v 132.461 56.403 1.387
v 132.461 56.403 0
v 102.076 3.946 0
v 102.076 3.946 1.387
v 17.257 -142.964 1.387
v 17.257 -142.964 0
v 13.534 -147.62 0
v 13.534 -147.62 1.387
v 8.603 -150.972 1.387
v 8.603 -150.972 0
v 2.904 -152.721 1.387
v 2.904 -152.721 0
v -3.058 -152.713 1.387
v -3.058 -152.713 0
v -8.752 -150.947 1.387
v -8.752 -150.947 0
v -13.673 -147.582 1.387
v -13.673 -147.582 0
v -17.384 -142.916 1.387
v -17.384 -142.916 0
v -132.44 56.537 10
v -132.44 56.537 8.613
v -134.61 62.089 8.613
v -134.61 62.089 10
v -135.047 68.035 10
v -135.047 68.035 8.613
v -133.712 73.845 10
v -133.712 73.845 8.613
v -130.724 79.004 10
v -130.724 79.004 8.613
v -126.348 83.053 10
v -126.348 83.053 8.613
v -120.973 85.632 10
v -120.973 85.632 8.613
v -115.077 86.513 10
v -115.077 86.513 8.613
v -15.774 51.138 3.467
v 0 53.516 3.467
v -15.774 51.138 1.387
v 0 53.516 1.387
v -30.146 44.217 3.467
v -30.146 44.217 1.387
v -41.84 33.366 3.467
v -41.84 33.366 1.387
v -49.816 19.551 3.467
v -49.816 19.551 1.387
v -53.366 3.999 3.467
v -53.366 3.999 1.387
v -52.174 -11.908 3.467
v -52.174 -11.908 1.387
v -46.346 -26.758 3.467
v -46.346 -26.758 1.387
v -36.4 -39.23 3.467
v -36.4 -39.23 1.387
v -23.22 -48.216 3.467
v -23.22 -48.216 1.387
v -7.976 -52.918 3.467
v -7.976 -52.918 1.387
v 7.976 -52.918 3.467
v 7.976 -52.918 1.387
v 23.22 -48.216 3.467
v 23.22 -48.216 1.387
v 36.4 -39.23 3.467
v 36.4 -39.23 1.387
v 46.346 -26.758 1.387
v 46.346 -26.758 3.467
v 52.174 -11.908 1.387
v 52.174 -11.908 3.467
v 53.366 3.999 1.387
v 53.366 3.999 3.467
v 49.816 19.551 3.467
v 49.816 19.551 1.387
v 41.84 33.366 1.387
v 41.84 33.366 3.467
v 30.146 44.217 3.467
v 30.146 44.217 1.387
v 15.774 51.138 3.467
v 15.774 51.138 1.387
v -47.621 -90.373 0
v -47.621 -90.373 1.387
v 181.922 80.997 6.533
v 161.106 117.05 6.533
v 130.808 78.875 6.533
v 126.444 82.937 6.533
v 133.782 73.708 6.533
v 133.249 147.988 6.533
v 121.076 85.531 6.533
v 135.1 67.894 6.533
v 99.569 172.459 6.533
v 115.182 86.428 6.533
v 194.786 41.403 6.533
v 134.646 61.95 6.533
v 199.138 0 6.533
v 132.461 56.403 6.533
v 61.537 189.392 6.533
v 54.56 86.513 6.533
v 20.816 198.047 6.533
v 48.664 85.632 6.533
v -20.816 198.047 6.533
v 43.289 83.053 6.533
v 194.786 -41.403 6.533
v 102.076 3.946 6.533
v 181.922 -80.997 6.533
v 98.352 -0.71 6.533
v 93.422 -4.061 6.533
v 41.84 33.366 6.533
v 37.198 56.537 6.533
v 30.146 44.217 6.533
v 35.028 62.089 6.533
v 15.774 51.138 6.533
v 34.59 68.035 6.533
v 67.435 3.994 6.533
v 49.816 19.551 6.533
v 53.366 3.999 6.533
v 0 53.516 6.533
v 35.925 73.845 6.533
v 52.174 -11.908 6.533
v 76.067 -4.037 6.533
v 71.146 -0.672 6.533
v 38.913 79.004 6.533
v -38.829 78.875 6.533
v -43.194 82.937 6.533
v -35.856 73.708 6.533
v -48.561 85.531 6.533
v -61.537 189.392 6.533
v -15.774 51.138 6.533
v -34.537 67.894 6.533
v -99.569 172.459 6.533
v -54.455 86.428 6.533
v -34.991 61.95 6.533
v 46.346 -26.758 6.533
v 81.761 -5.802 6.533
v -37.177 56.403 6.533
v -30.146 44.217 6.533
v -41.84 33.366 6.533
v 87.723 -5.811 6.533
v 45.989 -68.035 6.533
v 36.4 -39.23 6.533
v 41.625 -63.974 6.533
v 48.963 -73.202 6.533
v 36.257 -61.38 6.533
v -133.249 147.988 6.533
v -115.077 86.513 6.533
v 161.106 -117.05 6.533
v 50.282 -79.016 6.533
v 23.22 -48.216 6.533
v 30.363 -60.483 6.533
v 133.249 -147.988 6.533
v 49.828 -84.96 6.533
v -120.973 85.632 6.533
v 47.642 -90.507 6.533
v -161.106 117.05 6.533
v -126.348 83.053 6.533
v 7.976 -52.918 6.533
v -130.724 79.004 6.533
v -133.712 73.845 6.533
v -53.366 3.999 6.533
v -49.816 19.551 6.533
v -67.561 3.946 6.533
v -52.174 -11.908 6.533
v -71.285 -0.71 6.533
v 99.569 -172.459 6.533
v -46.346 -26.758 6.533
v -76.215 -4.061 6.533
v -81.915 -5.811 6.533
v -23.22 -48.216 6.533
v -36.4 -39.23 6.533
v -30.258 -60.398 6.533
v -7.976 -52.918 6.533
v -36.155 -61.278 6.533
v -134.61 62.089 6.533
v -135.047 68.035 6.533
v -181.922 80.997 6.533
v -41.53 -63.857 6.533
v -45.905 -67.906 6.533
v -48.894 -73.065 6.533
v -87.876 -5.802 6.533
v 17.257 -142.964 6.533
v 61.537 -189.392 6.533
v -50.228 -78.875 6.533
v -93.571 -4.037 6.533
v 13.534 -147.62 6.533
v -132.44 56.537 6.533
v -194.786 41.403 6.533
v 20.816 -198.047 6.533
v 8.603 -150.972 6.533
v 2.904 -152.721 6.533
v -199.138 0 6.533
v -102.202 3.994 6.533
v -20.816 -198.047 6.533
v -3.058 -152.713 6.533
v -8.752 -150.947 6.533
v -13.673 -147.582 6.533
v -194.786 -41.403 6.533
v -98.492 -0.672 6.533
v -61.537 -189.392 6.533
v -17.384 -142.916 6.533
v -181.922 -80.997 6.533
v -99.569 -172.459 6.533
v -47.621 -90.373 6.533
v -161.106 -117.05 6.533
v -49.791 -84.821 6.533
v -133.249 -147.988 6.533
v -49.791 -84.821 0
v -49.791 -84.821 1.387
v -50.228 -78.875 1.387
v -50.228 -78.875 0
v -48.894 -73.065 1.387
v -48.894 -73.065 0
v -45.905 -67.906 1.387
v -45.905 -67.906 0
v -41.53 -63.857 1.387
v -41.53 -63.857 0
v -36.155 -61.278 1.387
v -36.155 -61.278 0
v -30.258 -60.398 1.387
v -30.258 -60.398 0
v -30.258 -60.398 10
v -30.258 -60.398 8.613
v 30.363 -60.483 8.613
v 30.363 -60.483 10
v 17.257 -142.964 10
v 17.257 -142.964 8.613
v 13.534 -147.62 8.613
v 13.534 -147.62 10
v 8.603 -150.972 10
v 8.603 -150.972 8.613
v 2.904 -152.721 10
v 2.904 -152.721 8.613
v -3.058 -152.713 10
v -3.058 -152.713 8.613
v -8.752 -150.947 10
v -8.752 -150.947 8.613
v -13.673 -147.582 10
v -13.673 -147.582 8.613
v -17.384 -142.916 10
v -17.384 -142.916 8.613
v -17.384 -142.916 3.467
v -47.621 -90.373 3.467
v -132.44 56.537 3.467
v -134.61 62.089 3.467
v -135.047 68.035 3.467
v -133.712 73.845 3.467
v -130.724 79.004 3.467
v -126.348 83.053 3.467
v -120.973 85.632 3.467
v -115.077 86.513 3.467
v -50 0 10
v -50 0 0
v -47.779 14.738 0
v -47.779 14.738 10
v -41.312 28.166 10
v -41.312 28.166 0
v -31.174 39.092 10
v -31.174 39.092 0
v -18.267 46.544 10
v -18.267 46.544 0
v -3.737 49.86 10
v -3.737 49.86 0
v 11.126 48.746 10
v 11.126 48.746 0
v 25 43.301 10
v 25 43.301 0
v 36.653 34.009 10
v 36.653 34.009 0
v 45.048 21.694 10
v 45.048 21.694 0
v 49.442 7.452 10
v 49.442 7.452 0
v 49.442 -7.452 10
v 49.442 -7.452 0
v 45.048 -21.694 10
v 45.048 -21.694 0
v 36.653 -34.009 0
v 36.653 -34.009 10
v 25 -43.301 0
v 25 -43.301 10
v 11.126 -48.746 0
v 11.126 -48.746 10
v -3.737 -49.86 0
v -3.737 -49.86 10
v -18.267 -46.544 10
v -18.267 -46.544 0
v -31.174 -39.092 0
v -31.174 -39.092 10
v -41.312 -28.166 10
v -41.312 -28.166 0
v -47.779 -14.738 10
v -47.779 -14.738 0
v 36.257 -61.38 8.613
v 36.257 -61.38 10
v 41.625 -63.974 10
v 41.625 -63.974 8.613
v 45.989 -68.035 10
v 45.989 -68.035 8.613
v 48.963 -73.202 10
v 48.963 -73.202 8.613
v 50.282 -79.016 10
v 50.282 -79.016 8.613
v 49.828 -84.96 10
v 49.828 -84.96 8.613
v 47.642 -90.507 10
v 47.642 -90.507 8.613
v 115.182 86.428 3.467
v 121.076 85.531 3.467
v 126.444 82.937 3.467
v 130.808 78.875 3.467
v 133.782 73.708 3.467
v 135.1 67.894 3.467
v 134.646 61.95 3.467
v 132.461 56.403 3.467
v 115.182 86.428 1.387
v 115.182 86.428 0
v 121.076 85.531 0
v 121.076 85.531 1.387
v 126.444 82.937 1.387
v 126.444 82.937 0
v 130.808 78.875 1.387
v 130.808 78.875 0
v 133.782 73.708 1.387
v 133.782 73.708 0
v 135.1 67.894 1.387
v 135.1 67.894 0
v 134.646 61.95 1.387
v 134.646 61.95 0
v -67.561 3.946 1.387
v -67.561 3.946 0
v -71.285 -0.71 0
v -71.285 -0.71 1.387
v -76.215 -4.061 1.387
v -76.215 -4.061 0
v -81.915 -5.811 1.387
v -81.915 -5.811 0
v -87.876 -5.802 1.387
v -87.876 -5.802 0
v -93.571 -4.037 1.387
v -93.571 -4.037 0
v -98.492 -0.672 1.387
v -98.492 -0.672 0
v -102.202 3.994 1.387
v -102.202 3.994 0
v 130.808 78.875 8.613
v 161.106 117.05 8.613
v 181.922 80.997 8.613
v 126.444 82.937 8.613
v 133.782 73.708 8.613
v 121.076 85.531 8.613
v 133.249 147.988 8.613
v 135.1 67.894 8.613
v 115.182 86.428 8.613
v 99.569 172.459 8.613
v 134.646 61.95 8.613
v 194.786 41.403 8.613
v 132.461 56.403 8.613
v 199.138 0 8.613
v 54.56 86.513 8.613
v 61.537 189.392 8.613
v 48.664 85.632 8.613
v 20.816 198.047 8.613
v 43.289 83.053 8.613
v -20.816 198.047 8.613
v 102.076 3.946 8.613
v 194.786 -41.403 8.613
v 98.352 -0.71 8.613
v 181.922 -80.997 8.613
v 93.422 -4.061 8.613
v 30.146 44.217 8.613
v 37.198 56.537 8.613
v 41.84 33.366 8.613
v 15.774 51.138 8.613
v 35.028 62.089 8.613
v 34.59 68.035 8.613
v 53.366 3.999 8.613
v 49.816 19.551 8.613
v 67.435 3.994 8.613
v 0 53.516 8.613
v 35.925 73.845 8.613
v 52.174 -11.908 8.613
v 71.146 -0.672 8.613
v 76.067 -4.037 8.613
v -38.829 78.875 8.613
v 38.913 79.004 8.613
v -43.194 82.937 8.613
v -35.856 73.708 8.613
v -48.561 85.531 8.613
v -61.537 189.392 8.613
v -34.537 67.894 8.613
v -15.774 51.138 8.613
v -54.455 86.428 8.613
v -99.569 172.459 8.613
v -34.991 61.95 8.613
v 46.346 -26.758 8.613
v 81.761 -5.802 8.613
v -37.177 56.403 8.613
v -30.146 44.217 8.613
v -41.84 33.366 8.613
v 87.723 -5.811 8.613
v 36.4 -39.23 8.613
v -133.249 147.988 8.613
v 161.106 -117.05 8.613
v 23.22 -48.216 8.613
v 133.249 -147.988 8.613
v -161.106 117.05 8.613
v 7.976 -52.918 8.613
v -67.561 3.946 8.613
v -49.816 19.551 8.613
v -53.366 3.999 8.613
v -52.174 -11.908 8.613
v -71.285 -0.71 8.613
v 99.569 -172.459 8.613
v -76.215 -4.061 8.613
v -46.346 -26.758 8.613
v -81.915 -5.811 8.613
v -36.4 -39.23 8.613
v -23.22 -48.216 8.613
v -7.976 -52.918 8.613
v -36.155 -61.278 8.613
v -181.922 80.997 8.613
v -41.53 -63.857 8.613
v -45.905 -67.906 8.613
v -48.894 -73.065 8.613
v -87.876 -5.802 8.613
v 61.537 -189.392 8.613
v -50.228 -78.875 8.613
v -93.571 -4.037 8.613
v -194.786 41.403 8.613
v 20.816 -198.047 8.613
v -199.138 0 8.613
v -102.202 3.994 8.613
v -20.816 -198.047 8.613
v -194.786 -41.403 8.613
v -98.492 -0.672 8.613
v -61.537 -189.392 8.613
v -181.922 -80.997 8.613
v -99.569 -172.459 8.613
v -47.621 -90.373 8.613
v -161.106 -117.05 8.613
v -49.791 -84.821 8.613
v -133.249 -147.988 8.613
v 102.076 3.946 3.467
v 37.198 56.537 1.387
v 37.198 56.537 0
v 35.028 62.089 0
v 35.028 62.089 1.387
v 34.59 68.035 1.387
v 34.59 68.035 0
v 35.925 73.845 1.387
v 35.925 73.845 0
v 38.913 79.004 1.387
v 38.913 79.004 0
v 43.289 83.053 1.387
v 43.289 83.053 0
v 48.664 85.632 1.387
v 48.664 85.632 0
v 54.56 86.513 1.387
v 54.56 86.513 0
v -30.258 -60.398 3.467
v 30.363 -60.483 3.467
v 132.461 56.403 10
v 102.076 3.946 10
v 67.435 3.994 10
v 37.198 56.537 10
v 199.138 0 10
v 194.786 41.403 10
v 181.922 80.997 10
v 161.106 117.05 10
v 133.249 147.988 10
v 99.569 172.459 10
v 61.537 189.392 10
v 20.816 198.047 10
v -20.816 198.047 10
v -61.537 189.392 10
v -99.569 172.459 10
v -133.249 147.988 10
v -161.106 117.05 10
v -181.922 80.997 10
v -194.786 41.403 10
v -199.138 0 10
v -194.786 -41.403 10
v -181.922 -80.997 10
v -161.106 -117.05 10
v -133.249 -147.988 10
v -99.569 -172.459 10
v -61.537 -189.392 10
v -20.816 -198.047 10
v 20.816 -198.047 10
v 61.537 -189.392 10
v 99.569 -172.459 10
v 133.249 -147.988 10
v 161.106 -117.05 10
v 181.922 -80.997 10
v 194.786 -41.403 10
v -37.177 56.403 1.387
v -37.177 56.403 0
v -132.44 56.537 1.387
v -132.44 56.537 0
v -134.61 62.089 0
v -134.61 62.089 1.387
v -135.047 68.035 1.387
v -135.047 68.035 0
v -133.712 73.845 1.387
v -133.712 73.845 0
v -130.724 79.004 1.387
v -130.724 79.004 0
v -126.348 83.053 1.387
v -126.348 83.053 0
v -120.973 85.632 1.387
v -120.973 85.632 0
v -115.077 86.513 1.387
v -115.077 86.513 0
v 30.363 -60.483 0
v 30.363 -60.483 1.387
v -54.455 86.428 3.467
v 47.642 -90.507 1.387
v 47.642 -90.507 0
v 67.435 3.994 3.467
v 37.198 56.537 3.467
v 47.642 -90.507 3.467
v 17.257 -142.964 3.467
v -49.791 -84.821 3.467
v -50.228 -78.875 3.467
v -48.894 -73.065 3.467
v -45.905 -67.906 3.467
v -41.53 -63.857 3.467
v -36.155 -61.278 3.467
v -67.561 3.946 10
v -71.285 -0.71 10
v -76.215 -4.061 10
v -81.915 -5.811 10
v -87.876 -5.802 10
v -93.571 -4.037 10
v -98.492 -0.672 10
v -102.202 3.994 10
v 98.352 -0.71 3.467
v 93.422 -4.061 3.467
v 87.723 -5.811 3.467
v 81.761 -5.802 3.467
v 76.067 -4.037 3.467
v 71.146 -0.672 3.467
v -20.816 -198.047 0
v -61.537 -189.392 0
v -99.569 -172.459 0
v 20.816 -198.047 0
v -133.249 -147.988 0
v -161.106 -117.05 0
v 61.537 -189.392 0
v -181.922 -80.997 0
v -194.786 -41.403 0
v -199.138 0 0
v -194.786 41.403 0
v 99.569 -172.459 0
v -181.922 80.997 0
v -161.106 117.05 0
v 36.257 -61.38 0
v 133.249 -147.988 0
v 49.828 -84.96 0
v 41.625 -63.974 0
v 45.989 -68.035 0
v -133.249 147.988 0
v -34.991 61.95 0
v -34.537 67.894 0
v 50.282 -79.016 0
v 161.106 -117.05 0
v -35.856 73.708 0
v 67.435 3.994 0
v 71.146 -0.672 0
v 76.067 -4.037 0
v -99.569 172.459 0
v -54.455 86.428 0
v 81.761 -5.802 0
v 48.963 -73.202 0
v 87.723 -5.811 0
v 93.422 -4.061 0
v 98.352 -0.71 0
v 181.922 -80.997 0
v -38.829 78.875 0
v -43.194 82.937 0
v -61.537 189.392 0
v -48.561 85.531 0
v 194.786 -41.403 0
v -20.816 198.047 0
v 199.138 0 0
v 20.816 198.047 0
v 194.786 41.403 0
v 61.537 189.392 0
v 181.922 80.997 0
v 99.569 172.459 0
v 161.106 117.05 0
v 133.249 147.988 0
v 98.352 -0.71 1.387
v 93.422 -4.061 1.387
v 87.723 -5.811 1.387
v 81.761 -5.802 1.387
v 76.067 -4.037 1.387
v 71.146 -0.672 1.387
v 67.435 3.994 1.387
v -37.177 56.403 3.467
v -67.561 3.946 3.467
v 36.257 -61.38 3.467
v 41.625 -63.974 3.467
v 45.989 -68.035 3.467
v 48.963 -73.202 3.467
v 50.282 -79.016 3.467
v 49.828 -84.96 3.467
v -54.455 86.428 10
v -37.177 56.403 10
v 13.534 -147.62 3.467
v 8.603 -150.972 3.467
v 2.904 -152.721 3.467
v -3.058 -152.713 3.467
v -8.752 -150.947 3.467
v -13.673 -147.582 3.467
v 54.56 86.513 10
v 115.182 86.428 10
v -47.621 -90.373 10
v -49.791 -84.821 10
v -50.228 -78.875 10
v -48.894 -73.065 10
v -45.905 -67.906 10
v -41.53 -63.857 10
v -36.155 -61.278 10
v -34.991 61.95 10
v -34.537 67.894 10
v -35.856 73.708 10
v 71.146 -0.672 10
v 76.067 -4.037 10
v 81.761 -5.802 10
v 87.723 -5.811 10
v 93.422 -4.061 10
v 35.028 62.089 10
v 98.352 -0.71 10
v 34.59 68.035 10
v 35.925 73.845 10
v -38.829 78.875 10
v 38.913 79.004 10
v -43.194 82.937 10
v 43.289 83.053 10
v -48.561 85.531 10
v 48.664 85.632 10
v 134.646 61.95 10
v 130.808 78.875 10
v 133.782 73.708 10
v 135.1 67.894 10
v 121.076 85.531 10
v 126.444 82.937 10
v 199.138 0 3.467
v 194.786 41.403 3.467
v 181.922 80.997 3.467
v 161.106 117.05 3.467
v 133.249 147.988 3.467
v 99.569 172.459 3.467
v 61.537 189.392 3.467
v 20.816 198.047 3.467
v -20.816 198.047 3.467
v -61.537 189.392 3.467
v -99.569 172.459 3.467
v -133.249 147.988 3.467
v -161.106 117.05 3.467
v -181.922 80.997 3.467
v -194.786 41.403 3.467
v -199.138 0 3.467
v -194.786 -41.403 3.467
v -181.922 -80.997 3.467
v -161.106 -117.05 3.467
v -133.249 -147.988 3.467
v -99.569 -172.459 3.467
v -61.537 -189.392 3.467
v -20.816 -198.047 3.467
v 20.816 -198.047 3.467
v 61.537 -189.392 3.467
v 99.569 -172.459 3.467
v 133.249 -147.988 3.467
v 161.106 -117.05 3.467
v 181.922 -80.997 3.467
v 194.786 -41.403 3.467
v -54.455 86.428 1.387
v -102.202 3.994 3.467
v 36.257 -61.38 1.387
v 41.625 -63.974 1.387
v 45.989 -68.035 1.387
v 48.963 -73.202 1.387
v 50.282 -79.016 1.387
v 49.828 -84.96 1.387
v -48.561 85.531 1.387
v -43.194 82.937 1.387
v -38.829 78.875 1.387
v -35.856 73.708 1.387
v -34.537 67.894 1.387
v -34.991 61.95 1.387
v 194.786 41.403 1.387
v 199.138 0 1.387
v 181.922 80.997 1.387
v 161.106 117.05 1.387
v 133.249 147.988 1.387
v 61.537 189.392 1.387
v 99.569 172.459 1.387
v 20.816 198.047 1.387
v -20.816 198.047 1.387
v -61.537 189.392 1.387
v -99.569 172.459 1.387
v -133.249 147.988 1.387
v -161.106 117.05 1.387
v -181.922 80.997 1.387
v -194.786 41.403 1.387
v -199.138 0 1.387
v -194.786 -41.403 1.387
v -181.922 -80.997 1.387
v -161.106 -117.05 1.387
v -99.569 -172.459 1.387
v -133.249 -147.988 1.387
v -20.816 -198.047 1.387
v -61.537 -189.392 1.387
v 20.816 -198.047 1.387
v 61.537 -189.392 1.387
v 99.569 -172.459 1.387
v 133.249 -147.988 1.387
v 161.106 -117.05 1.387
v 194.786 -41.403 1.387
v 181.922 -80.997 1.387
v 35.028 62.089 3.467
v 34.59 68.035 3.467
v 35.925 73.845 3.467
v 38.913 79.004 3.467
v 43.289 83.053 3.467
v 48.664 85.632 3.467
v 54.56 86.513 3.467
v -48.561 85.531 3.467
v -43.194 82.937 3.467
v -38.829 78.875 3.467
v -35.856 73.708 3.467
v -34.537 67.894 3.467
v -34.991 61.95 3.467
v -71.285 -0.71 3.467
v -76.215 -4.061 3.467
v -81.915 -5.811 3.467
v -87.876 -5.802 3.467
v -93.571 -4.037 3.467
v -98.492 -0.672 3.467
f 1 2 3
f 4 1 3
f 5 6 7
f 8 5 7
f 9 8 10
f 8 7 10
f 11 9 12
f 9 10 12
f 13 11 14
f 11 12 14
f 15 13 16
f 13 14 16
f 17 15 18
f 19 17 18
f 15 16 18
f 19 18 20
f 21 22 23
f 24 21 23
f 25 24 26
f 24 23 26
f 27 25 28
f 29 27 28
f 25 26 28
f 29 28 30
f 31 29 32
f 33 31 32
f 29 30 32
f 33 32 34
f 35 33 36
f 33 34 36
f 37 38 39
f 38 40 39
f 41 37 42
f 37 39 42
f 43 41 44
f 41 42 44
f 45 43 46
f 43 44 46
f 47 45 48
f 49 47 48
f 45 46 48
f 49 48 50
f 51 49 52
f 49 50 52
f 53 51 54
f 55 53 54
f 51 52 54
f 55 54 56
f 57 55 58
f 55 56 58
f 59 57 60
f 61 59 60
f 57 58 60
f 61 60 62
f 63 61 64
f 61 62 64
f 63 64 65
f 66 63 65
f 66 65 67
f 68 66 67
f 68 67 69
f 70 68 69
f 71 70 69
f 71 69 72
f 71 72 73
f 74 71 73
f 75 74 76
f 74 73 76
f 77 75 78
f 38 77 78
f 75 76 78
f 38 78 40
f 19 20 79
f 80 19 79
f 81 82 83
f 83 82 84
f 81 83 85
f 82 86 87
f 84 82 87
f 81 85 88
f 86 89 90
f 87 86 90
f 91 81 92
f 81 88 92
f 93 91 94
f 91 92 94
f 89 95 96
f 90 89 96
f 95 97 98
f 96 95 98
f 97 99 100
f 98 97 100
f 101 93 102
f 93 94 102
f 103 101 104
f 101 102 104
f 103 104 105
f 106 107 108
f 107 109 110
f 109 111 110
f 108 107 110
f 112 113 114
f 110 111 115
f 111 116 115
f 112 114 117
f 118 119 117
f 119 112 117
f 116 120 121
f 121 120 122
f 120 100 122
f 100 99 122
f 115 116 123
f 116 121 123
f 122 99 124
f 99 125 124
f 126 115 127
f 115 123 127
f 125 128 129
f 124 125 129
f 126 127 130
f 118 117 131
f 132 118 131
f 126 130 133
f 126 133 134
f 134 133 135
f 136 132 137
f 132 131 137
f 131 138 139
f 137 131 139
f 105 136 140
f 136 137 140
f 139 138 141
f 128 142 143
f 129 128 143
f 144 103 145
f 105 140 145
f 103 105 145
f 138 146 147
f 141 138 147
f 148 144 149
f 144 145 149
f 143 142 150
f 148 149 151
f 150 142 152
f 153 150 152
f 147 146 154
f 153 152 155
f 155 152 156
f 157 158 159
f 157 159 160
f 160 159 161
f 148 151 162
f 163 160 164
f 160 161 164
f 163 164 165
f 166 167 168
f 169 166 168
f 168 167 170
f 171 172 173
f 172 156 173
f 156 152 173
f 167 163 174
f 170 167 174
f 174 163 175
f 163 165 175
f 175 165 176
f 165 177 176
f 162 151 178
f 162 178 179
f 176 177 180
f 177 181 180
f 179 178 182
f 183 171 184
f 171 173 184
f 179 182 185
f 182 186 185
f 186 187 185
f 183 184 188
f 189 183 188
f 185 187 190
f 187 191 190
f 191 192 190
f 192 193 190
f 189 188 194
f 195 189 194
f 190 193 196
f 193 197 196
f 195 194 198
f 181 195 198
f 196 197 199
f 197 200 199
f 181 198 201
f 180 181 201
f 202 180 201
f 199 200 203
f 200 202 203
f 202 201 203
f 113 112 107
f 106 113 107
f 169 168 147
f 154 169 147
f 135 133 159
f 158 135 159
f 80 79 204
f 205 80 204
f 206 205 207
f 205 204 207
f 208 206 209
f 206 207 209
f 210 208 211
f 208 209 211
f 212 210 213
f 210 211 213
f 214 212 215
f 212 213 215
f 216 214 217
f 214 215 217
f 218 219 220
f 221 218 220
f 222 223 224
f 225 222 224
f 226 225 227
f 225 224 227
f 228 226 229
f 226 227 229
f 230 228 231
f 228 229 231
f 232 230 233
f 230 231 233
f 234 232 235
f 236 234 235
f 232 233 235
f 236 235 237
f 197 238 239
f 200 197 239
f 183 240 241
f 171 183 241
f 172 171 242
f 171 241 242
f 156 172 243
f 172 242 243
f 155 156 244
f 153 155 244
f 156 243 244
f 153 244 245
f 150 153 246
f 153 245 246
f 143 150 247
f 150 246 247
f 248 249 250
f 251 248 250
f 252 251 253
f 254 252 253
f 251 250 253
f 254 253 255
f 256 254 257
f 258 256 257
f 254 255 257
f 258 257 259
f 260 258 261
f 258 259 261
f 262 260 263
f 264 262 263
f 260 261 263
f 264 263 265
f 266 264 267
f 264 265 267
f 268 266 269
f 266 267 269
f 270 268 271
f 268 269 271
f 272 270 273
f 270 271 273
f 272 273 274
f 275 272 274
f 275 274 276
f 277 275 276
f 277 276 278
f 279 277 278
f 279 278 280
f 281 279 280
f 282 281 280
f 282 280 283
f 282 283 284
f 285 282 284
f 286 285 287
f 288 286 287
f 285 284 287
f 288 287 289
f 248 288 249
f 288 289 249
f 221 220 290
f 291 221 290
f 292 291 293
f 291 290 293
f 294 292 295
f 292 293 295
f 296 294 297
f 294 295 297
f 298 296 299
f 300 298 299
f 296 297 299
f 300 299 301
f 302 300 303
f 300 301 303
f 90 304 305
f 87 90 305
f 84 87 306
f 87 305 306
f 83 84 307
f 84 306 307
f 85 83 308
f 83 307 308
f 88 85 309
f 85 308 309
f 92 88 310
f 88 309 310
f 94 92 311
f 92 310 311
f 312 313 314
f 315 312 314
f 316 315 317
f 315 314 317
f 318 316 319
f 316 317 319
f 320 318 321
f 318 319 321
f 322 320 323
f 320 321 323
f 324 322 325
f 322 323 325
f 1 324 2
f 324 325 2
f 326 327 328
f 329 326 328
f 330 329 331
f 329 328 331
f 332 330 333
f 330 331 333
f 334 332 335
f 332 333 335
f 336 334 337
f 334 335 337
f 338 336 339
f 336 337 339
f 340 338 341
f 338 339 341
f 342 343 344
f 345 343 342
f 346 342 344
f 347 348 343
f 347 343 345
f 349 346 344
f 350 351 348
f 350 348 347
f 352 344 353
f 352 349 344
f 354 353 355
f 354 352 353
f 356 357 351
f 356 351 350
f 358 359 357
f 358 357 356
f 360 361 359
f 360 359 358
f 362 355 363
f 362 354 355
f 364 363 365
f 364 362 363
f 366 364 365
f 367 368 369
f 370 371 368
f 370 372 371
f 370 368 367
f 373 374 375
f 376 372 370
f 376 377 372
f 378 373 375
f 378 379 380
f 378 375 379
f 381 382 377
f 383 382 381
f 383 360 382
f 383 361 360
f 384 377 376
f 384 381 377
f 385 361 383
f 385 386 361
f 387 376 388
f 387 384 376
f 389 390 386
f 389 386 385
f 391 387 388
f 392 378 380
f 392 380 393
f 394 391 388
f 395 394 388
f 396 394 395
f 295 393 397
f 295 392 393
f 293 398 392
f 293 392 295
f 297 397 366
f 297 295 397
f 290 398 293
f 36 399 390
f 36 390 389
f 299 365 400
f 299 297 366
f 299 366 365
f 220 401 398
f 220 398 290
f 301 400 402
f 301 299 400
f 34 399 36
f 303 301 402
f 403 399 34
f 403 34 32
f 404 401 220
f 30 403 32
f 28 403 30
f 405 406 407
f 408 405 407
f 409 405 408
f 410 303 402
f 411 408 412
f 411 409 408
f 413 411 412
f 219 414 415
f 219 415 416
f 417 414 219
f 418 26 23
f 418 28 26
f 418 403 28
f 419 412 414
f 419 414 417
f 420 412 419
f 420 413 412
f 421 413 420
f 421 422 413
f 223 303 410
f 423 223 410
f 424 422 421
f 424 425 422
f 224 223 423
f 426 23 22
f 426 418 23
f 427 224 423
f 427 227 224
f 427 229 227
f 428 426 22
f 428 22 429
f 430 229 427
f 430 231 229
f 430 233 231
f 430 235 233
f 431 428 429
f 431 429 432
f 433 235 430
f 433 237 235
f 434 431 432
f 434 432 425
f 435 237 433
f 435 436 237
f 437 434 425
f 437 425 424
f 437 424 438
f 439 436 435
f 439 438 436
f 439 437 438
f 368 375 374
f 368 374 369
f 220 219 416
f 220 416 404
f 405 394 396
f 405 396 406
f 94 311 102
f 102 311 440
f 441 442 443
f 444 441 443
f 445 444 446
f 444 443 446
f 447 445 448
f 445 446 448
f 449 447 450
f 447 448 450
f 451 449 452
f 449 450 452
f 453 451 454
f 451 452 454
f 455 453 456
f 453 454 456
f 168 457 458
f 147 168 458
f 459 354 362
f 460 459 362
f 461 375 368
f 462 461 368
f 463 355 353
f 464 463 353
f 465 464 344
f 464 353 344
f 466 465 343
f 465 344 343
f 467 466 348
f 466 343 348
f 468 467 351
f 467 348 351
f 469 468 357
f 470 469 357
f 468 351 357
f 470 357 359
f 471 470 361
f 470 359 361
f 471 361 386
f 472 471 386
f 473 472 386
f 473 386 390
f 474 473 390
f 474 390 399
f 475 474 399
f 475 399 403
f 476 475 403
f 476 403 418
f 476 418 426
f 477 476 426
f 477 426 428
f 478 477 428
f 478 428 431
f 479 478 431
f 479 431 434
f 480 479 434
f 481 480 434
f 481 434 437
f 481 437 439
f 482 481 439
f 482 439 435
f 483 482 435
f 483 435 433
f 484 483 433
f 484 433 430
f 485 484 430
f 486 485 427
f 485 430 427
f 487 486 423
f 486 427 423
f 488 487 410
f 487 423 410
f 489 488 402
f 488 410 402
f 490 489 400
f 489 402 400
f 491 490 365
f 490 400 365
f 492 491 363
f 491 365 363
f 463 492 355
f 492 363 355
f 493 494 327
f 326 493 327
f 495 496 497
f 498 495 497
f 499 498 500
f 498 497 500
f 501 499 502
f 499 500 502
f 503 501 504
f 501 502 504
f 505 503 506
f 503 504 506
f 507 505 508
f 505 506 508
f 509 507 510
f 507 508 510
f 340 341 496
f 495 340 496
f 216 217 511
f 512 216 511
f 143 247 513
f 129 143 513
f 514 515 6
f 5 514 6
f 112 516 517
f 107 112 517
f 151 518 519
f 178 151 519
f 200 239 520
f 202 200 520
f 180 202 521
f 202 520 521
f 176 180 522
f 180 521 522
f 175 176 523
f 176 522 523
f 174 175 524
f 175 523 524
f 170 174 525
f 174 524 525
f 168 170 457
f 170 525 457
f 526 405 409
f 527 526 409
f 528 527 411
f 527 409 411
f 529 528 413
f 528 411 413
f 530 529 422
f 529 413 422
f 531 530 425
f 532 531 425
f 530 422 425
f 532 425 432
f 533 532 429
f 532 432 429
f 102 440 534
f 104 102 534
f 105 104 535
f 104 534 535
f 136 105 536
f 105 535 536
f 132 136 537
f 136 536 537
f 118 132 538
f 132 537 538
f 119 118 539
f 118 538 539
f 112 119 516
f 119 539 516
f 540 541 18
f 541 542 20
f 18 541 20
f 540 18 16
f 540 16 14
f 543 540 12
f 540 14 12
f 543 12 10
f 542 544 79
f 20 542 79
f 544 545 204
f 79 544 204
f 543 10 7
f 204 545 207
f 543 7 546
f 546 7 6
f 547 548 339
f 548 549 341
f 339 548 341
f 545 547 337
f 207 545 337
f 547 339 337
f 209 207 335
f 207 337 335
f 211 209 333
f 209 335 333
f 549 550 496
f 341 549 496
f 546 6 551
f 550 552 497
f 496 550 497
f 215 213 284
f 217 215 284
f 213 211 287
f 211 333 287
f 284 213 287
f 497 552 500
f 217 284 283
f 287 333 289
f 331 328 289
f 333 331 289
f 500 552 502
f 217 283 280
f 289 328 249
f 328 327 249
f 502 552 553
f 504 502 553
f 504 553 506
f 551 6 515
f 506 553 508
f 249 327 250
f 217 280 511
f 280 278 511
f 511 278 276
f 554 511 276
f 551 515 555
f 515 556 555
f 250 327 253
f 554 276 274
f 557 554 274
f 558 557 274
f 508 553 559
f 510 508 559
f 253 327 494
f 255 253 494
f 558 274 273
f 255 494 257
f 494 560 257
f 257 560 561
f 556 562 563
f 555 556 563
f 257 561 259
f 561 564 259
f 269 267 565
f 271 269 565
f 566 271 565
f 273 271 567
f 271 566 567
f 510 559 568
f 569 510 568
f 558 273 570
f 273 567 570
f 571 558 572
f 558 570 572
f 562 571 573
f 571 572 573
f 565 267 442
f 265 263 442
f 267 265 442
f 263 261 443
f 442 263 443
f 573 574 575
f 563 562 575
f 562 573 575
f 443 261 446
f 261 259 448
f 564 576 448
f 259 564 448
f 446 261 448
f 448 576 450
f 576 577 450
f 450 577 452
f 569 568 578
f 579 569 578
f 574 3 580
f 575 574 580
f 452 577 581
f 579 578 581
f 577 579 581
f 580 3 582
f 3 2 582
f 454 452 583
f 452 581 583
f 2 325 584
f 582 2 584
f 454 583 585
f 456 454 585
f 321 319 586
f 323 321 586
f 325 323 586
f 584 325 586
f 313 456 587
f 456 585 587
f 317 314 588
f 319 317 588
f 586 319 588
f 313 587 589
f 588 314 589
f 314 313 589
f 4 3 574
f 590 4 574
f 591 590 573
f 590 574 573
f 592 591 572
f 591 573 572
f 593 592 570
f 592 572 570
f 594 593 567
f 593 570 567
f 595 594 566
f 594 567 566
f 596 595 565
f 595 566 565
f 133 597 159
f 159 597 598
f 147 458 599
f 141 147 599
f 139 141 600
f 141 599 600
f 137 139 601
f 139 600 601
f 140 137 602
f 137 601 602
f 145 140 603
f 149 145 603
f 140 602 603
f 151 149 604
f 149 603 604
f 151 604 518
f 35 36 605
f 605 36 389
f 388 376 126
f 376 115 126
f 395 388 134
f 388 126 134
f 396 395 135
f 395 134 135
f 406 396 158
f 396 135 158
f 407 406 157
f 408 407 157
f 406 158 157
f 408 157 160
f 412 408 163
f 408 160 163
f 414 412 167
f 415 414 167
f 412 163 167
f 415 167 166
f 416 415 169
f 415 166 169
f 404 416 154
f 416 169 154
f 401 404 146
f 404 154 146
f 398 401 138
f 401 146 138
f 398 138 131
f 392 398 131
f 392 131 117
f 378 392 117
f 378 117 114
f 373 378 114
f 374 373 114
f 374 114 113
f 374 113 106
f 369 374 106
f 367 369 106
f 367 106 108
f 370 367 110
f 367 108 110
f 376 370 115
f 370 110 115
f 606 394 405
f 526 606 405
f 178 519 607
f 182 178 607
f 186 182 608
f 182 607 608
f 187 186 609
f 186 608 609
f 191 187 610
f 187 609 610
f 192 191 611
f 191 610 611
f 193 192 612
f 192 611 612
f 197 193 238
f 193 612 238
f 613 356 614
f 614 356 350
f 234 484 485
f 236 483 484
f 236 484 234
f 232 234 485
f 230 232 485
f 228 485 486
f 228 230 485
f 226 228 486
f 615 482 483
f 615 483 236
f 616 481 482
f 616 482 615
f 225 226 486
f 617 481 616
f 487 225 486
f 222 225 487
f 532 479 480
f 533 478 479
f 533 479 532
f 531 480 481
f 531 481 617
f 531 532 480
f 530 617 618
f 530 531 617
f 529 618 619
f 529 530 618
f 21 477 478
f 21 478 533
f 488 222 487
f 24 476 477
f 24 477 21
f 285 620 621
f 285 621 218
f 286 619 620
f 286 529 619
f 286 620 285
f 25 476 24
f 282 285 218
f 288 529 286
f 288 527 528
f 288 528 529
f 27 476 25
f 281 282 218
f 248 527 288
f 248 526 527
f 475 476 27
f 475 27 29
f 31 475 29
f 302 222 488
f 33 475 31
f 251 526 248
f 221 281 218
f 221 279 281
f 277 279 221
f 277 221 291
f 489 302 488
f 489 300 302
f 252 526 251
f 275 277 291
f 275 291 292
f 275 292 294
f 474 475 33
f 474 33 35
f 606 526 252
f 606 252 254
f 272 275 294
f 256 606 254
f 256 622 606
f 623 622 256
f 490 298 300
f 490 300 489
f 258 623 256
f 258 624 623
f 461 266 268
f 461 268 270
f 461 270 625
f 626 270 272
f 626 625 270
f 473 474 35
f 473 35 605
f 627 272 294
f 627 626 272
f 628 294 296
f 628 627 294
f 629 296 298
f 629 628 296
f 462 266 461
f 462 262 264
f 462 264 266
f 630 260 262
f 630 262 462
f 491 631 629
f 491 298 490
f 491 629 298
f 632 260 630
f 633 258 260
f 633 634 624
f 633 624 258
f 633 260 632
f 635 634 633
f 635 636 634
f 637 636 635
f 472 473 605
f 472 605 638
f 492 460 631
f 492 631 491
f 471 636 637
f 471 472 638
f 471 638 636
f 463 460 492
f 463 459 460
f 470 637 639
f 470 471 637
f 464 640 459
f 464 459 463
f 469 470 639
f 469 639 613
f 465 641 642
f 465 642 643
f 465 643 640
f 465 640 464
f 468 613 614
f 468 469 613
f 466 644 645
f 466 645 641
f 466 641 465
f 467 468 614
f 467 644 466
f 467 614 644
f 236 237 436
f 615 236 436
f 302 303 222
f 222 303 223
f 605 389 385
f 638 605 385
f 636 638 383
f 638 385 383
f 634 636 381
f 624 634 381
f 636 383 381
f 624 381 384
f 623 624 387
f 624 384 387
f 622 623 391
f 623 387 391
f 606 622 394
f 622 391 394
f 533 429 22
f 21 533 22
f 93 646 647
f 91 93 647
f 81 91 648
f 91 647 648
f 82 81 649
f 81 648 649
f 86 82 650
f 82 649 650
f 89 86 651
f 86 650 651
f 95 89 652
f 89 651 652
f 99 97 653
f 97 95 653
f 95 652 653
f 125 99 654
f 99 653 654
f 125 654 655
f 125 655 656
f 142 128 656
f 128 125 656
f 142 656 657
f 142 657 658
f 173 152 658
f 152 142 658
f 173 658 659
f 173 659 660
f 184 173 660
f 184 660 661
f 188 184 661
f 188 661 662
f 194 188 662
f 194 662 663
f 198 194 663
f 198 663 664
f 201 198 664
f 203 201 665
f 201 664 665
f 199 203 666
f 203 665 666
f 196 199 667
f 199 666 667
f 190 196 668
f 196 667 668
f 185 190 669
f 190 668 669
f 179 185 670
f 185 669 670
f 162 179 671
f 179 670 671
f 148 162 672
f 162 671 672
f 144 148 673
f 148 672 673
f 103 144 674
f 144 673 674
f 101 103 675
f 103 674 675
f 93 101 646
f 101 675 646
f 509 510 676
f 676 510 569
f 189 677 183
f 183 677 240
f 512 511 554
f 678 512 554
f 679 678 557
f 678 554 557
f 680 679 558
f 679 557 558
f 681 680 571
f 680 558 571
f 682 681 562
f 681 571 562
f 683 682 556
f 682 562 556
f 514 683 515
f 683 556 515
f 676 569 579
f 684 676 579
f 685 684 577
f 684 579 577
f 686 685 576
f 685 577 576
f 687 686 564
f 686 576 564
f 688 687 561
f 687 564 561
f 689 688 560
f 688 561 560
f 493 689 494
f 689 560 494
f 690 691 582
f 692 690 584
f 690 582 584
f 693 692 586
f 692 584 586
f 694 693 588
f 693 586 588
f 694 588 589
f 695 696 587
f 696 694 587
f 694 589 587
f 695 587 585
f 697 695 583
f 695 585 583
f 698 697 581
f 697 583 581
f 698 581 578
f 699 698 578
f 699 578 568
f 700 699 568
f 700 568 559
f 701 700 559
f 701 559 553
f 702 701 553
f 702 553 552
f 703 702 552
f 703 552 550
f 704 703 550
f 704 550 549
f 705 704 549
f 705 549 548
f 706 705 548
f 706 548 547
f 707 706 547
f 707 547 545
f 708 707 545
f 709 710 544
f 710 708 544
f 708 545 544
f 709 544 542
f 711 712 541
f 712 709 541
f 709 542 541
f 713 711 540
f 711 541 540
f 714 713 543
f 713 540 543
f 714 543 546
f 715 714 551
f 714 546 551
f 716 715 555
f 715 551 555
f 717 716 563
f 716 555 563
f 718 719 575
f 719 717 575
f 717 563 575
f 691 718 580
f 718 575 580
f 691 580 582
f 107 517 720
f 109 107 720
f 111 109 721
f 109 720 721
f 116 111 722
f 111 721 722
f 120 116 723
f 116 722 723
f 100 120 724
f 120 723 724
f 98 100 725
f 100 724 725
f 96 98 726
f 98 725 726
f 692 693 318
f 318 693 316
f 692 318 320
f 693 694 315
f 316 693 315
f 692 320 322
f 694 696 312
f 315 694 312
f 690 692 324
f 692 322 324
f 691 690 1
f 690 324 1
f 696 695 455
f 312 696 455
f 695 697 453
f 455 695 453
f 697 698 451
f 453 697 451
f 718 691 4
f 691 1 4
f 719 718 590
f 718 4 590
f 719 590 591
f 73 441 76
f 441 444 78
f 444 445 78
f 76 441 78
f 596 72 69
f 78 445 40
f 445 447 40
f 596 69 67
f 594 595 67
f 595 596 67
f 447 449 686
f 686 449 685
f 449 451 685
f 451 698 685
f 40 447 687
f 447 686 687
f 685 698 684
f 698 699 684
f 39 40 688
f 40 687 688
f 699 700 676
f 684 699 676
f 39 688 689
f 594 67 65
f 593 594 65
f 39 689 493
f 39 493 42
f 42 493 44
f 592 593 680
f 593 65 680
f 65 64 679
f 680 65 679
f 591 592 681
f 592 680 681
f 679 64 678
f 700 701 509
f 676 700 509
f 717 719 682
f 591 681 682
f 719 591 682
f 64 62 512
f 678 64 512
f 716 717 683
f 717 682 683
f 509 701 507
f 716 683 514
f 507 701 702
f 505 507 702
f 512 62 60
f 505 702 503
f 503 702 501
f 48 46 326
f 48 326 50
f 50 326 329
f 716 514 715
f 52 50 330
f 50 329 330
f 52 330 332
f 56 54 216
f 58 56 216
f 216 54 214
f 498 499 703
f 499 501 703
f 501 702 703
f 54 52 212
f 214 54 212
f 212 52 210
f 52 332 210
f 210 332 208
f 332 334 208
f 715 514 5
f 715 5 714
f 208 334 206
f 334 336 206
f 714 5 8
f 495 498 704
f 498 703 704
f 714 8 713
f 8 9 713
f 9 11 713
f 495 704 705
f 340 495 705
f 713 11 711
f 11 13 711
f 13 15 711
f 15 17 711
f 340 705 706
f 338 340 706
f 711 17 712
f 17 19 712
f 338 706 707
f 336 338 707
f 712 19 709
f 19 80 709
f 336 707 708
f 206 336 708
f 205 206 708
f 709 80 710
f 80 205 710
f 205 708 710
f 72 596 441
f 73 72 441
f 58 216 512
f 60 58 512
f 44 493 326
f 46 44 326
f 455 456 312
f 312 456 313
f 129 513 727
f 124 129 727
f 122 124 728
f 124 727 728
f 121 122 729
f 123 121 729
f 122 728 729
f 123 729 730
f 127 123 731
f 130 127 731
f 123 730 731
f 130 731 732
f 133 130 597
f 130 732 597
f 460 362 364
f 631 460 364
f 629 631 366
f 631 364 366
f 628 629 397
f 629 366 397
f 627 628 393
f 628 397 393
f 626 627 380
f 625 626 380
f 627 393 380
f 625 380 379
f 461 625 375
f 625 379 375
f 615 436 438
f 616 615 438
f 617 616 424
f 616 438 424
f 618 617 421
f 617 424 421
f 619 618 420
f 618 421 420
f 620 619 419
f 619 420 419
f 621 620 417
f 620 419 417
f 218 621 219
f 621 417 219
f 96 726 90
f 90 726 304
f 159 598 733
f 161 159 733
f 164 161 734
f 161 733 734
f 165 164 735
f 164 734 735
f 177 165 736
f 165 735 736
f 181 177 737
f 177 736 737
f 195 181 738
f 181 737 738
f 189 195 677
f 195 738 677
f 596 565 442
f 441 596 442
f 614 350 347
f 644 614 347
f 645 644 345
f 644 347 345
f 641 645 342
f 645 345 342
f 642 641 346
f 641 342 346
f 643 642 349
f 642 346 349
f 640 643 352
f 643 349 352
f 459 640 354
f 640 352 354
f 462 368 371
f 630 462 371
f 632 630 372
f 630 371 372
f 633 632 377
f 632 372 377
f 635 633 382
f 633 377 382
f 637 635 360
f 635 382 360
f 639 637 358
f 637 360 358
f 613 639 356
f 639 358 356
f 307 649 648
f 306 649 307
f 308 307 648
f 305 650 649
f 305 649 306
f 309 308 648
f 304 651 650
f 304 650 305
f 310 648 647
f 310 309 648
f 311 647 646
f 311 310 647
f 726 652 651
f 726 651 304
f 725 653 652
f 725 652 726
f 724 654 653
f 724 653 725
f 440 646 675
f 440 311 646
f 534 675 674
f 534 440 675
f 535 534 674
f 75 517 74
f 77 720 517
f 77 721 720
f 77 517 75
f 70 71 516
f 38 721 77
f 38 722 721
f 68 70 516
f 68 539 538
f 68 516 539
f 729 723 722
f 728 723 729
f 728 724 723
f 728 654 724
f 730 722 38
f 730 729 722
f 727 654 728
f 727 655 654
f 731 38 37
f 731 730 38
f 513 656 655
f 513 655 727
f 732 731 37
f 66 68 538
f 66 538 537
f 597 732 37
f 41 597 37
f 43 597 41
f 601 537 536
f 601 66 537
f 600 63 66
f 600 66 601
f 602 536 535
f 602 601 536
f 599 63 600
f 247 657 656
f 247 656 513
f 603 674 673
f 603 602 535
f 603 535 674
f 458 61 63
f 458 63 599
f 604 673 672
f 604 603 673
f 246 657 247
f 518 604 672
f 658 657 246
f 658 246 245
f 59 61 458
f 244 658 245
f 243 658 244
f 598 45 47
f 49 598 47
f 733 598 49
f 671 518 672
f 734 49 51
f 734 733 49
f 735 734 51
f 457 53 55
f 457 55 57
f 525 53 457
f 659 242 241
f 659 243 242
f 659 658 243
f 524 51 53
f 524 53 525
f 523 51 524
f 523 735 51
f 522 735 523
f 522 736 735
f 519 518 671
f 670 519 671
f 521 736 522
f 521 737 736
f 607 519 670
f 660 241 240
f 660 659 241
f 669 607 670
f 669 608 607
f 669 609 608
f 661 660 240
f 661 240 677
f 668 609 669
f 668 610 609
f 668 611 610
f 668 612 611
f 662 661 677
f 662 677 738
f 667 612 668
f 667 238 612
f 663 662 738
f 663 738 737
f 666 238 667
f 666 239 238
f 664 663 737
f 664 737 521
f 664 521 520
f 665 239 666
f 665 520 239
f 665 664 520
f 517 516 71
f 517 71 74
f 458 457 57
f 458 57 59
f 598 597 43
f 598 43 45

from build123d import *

# Parameters (mm, degrees)
SKETCH_1_R          = 199.1381229
EXTRUDE_1_DEPTH     = 10
SKETCH_2_R          = 50
CUT_EXTRUDE_1_DEPTH = 10
SKETCH_4_W          = 2.080900767
SKETCH_4_H          = 145.70816296


with BuildPart() as part:
    # Эскиз1 → Бобышка-Вытянуть1 (new body)
    with BuildSketch(Plane.XY):
        Circle(SKETCH_1_R)
    extrude(amount=EXTRUDE_1_DEPTH)

    # Эскиз2 → Вырез-Вытянуть1 (cut)
    with BuildSketch(Plane(origin=(0, 0, 0), x_dir=(-1, 0, 0), z_dir=(0, 0, -1))):
        Circle(SKETCH_2_R)
        with BuildLine():
            Line((-132.460540699, 56.403298942), (-102.076076874, 3.945846105))
            ThreePointArc((-102.076076874, 3.945846105), (-84.74156592, -6.029860886), (-67.435094768, 3.994412468))
            Line((-67.435094768, 3.994412468), (-37.197839906, 56.536856438))
            ThreePointArc((-37.197839906, 56.536856438), (-37.225879708, 76.536836783), (-54.560390663, 86.512543774))
            Line((-54.560390663, 86.512543774), (-115.182109349, 86.427552639))
            ThreePointArc((-115.182109349, 86.427552639), (-132.488580502, 76.403279286), (-132.460540699, 56.403298942))
        make_face()
        with BuildLine():
            Line((17.383580609, -142.915842715), (47.620835471, -90.373398744))
            ThreePointArc((47.620835471, -90.373398744), (47.592795668, -70.3734184), (30.258284714, -60.397711409))
            Line((30.258284714, -60.397711409), (-30.363433973, -60.482702544))
            ThreePointArc((-30.363433973, -60.482702544), (-47.669905125, -70.506975897), (-47.641865322, -90.506956241))
            Line((-47.641865322, -90.506956241), (-17.257401498, -142.964409078))
            ThreePointArc((-17.257401498, -142.964409078), (0.077109457, -152.940116069), (17.383580609, -142.915842715))
        make_face()
        with BuildLine():
            Line((115.07696009, 86.512543774), (54.455241404, 86.427552639))
            ThreePointArc((54.455241404, 86.427552639), (37.148770252, 76.403279286), (37.176810054, 56.403298942))
            Line((37.176810054, 56.403298942), (67.561273879, 3.945846105))
            ThreePointArc((67.561273879, 3.945846105), (84.895784833, -6.029860886), (102.202255985, 3.994412468))
            Line((102.202255985, 3.994412468), (132.439510847, 56.536856438))
            ThreePointArc((132.439510847, 56.536856438), (132.411471045, 76.536836783), (115.07696009, 86.512543774))
        make_face()
    extrude(amount=-CUT_EXTRUDE_1_DEPTH, mode=Mode.SUBTRACT)

    # Эскиз4 → Вырез-Повернуть1 (revolve, cut)
    with BuildSketch(Plane(origin=(0, 0, 0), x_dir=(0, 0, -1), z_dir=(1, 0, 0))):
        with Locations((-7.572959809, 126.369713558)):
            Rectangle(SKETCH_4_W, SKETCH_4_H)
        with Locations((-2.427040192, 126.369713558)):
            Rectangle(SKETCH_4_W, SKETCH_4_H)
    revolve(axis=Axis((0, 0, 0.50000655), (0, 0, 1)), mode=Mode.SUBTRACT)


solid = part.part
